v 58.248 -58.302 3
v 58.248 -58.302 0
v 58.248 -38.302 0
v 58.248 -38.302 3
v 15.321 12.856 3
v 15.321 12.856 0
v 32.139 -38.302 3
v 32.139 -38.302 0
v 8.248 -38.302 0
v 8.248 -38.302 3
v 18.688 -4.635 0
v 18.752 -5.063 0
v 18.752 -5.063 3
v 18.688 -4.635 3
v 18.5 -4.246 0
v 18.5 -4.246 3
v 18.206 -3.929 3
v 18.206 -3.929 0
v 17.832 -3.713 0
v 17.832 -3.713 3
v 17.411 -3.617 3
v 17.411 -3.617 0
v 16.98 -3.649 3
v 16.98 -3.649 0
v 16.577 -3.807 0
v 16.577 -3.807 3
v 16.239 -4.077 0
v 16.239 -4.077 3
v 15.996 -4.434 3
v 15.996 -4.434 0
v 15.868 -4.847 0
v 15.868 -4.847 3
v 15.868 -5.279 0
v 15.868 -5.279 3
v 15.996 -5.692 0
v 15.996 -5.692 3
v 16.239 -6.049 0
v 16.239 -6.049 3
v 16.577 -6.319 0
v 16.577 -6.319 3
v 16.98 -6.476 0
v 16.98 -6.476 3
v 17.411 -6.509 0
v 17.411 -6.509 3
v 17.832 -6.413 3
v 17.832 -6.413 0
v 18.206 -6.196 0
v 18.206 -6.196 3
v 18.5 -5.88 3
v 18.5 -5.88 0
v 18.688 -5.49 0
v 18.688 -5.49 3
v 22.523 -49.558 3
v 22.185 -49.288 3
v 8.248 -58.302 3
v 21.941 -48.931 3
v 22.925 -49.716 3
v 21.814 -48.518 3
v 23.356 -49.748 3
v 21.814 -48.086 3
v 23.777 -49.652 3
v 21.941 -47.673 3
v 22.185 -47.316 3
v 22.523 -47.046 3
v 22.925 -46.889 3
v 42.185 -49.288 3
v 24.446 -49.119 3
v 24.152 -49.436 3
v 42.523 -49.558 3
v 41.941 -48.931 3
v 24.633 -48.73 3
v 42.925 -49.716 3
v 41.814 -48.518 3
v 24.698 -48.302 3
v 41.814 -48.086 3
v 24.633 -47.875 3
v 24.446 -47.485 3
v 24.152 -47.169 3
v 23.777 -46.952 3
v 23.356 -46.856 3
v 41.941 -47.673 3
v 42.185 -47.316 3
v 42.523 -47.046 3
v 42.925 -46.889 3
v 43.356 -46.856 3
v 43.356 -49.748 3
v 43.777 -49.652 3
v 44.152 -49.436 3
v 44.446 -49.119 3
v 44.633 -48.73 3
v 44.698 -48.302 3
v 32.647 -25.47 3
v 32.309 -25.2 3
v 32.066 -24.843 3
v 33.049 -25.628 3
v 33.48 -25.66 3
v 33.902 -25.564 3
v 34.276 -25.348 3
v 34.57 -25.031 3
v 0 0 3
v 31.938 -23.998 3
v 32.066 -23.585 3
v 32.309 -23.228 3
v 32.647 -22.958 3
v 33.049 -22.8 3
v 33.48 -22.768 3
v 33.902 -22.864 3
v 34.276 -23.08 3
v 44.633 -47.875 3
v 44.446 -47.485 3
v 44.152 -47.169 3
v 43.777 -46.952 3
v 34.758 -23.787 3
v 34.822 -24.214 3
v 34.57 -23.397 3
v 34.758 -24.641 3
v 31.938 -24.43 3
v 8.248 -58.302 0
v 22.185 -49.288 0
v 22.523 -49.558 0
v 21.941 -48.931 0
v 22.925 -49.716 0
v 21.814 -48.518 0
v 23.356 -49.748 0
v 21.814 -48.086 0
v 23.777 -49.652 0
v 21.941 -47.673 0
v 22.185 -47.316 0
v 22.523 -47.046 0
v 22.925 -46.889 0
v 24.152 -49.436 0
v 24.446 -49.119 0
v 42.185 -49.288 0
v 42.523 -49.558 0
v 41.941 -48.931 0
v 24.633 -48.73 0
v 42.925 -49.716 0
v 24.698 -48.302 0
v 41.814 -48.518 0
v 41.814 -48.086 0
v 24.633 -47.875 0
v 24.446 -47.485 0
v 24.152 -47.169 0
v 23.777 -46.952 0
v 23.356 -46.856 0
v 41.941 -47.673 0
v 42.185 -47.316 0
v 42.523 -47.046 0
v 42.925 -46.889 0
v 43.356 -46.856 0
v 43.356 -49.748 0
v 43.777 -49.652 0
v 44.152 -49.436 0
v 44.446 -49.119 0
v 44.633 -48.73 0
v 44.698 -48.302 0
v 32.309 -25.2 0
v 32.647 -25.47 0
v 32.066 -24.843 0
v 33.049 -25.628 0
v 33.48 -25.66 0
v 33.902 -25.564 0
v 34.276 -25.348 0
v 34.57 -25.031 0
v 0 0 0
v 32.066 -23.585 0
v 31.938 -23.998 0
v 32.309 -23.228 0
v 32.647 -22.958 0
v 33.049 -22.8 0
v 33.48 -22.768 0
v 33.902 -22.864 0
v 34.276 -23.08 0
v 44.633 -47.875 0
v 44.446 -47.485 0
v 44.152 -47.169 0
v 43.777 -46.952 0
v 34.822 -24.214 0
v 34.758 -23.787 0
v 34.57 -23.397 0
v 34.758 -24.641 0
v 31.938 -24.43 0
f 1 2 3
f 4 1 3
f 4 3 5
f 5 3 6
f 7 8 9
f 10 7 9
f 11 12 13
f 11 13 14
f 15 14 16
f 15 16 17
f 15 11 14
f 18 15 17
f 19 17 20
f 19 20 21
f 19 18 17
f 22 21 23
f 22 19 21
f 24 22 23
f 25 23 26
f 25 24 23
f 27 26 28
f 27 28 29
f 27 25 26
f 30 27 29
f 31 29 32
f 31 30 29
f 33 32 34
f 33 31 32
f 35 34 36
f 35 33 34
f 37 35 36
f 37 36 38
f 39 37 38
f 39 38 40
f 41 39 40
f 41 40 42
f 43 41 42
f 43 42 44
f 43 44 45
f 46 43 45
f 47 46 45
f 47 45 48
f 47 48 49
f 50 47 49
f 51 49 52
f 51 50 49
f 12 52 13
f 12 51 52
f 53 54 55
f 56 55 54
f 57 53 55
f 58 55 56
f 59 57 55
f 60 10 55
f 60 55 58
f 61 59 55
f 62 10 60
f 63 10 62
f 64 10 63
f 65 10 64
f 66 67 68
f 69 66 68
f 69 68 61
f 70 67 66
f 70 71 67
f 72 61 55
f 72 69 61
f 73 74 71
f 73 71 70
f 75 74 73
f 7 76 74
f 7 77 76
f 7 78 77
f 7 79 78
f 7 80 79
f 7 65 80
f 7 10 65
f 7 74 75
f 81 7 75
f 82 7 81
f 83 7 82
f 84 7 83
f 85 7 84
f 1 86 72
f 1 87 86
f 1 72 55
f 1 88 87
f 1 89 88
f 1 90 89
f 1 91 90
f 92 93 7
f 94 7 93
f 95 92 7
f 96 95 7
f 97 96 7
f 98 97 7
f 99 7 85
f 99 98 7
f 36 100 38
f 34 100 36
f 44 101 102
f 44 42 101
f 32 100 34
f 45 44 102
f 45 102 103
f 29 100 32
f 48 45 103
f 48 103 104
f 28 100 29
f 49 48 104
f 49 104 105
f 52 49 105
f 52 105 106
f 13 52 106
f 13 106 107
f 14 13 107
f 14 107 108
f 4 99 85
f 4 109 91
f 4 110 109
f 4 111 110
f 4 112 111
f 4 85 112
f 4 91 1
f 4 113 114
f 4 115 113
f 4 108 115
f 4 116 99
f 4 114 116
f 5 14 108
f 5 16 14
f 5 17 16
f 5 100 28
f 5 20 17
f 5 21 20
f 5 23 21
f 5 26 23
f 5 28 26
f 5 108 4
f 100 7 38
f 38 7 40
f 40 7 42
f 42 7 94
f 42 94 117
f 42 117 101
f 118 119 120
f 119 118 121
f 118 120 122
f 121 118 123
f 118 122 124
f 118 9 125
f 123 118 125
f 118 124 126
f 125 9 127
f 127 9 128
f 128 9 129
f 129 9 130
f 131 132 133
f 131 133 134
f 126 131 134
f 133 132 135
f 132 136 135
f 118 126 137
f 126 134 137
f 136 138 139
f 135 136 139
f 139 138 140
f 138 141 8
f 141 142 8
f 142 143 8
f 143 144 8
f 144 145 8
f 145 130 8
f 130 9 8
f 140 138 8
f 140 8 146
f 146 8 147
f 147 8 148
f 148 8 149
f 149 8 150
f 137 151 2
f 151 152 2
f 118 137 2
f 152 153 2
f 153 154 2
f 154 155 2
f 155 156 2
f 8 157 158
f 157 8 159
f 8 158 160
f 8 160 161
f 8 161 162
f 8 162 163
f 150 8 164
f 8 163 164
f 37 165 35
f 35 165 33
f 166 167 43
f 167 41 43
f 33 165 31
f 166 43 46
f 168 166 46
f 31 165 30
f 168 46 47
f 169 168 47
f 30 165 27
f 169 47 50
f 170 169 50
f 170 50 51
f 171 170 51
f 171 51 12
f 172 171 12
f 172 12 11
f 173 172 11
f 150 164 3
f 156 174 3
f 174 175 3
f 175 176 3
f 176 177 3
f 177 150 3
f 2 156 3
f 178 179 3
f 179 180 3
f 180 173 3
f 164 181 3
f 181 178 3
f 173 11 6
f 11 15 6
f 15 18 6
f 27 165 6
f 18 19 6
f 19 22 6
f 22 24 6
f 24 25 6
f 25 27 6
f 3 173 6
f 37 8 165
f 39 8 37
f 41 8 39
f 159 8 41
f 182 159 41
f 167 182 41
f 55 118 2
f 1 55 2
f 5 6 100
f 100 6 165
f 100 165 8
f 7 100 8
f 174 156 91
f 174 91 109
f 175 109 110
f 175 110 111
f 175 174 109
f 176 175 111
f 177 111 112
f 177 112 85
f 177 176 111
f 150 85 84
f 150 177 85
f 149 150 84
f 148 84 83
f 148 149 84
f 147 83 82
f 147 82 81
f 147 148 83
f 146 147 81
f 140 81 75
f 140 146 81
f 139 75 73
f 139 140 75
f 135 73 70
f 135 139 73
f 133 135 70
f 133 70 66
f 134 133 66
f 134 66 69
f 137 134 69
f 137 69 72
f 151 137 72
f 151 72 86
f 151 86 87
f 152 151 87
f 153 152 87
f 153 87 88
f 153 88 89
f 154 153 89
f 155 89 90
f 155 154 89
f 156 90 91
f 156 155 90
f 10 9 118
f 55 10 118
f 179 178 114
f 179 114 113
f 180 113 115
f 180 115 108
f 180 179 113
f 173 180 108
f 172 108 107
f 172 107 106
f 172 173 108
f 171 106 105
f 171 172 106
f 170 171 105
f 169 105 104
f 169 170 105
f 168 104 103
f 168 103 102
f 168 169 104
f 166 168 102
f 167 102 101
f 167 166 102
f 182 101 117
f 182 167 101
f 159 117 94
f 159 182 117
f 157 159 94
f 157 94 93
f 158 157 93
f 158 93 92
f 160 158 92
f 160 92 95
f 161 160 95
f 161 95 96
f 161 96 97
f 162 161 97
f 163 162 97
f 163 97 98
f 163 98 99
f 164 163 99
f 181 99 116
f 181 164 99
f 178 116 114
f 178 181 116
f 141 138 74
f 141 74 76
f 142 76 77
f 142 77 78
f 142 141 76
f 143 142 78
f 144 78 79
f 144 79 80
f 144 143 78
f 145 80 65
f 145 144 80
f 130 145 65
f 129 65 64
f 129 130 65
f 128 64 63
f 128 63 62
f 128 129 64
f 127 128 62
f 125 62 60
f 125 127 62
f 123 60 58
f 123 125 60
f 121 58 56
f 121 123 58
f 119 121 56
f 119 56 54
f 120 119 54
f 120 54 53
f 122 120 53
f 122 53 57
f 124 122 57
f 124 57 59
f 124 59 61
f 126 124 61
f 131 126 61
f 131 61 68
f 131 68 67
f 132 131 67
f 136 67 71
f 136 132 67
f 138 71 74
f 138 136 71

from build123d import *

# Parameters (mm, degrees)
SKETCH1_R           = 1.45
BOSS_EXTRUDE1_DEPTH = 3


with BuildPart() as part:
    # Sketch1 → Boss-Extrude1 (new body)
    with BuildSketch(Plane.XY):
        Polygon((0, 0), (32.139380484, -38.302222156), (8.247526271, -38.302222156), (8.247526271, -58.302222156), (58.247526271, -58.302222156), (58.247526271, -38.302222156), (15.320888862, 12.855752194), align=None)
        with Locations((23.247526271, -48.302222156)):
            Circle(SKETCH1_R, mode=Mode.SUBTRACT)
        with Locations((43.247526271, -48.302222156)):
            Circle(SKETCH1_R, mode=Mode.SUBTRACT)
        with Locations((17.302258576, -5.06279055)):
            Circle(SKETCH1_R, mode=Mode.SUBTRACT)
        with Locations((33.371948819, -24.213901628)):
            Circle(SKETCH1_R, mode=Mode.SUBTRACT)
    extrude(amount=BOSS_EXTRUDE1_DEPTH)


solid = part.part
